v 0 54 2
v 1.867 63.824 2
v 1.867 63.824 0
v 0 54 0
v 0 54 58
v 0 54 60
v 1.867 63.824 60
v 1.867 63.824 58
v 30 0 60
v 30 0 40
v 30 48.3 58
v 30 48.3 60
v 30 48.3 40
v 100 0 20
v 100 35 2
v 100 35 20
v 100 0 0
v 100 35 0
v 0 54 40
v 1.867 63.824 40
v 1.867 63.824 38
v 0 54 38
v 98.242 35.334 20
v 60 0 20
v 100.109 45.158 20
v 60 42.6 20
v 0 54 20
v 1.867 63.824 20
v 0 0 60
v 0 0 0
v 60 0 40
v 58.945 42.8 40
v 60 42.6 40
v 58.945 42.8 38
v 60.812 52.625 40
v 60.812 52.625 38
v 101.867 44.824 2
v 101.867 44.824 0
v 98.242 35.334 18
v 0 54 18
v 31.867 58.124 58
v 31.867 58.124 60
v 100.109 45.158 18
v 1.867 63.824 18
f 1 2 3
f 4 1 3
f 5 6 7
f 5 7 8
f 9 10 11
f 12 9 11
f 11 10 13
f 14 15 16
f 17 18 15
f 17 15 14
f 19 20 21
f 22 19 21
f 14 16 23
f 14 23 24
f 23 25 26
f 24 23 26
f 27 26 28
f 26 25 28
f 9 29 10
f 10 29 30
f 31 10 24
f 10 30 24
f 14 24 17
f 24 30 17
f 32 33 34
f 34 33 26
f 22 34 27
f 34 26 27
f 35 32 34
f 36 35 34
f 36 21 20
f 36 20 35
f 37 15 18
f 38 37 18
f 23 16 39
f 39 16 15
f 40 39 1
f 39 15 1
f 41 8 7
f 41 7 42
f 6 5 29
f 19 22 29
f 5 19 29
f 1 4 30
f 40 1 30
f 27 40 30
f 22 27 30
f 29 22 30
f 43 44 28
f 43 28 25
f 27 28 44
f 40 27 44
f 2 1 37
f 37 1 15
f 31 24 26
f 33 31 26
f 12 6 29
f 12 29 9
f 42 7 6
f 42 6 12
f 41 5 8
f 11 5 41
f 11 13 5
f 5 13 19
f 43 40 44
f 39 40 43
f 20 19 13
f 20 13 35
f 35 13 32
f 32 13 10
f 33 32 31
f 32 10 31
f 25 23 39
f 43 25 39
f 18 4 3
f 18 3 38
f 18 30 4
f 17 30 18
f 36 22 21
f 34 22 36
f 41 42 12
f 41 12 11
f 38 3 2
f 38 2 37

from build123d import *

# Parameters (mm, degrees)
BOSS_EXTRUDE1_DEPTH = 20
BOSS_EXTRUDE2_DEPTH = 20
BOSS_EXTRUDE3_DEPTH = 20
SKETCH4_W           = 101.78899744
SKETCH4_H           = 2
SKETCH4_W_2         = 100
SKETCH4_W_3         = 60
SKETCH4_W_4         = 30.536699232
BOSS_EXTRUDE4_DEPTH = 10


with BuildPart() as part:
    # Sketch1 → Boss-Extrude1 (new body)
    with BuildSketch(Plane.XY):
        Polygon((0, 0), (0, 54), (100, 35), (100, 0), align=None)
    extrude(amount=BOSS_EXTRUDE1_DEPTH)

    # Sketch2 → Boss-Extrude2 (add)
    with BuildSketch(Plane.XY.offset(20)):
        Polygon((0, 54), (0, 0), (60, 0), (60, 42.6), align=None)
    extrude(amount=BOSS_EXTRUDE2_DEPTH)

    # Sketch3 → Boss-Extrude3 (add)
    with BuildSketch(Plane.XY.offset(40)):
        Polygon((0, 54), (0, 0), (30, 0), (30, 48.3), align=None)
    extrude(amount=BOSS_EXTRUDE3_DEPTH)

    # Sketch4 → Boss-Extrude4 (add)
    with BuildSketch(Plane(origin=(9.902519062, 52.118521378, 0), x_dir=(0.982424451701422, -0.1866606458232701, 0), z_dir=(0.1866606458232701, 0.982424451701422, 0))):
        with Locations((40.814823846, -1)):
            Rectangle(SKETCH4_W, SKETCH4_H)
        with Locations((39.920325126, -19)):
            Rectangle(SKETCH4_W_2, SKETCH4_H)
        with Locations((19.920325126, -39)):
            Rectangle(SKETCH4_W_3, SKETCH4_H)
        with Locations((5.188674742, -59)):
            Rectangle(SKETCH4_W_4, SKETCH4_H)
    extrude(amount=BOSS_EXTRUDE4_DEPTH)


solid = part.part
